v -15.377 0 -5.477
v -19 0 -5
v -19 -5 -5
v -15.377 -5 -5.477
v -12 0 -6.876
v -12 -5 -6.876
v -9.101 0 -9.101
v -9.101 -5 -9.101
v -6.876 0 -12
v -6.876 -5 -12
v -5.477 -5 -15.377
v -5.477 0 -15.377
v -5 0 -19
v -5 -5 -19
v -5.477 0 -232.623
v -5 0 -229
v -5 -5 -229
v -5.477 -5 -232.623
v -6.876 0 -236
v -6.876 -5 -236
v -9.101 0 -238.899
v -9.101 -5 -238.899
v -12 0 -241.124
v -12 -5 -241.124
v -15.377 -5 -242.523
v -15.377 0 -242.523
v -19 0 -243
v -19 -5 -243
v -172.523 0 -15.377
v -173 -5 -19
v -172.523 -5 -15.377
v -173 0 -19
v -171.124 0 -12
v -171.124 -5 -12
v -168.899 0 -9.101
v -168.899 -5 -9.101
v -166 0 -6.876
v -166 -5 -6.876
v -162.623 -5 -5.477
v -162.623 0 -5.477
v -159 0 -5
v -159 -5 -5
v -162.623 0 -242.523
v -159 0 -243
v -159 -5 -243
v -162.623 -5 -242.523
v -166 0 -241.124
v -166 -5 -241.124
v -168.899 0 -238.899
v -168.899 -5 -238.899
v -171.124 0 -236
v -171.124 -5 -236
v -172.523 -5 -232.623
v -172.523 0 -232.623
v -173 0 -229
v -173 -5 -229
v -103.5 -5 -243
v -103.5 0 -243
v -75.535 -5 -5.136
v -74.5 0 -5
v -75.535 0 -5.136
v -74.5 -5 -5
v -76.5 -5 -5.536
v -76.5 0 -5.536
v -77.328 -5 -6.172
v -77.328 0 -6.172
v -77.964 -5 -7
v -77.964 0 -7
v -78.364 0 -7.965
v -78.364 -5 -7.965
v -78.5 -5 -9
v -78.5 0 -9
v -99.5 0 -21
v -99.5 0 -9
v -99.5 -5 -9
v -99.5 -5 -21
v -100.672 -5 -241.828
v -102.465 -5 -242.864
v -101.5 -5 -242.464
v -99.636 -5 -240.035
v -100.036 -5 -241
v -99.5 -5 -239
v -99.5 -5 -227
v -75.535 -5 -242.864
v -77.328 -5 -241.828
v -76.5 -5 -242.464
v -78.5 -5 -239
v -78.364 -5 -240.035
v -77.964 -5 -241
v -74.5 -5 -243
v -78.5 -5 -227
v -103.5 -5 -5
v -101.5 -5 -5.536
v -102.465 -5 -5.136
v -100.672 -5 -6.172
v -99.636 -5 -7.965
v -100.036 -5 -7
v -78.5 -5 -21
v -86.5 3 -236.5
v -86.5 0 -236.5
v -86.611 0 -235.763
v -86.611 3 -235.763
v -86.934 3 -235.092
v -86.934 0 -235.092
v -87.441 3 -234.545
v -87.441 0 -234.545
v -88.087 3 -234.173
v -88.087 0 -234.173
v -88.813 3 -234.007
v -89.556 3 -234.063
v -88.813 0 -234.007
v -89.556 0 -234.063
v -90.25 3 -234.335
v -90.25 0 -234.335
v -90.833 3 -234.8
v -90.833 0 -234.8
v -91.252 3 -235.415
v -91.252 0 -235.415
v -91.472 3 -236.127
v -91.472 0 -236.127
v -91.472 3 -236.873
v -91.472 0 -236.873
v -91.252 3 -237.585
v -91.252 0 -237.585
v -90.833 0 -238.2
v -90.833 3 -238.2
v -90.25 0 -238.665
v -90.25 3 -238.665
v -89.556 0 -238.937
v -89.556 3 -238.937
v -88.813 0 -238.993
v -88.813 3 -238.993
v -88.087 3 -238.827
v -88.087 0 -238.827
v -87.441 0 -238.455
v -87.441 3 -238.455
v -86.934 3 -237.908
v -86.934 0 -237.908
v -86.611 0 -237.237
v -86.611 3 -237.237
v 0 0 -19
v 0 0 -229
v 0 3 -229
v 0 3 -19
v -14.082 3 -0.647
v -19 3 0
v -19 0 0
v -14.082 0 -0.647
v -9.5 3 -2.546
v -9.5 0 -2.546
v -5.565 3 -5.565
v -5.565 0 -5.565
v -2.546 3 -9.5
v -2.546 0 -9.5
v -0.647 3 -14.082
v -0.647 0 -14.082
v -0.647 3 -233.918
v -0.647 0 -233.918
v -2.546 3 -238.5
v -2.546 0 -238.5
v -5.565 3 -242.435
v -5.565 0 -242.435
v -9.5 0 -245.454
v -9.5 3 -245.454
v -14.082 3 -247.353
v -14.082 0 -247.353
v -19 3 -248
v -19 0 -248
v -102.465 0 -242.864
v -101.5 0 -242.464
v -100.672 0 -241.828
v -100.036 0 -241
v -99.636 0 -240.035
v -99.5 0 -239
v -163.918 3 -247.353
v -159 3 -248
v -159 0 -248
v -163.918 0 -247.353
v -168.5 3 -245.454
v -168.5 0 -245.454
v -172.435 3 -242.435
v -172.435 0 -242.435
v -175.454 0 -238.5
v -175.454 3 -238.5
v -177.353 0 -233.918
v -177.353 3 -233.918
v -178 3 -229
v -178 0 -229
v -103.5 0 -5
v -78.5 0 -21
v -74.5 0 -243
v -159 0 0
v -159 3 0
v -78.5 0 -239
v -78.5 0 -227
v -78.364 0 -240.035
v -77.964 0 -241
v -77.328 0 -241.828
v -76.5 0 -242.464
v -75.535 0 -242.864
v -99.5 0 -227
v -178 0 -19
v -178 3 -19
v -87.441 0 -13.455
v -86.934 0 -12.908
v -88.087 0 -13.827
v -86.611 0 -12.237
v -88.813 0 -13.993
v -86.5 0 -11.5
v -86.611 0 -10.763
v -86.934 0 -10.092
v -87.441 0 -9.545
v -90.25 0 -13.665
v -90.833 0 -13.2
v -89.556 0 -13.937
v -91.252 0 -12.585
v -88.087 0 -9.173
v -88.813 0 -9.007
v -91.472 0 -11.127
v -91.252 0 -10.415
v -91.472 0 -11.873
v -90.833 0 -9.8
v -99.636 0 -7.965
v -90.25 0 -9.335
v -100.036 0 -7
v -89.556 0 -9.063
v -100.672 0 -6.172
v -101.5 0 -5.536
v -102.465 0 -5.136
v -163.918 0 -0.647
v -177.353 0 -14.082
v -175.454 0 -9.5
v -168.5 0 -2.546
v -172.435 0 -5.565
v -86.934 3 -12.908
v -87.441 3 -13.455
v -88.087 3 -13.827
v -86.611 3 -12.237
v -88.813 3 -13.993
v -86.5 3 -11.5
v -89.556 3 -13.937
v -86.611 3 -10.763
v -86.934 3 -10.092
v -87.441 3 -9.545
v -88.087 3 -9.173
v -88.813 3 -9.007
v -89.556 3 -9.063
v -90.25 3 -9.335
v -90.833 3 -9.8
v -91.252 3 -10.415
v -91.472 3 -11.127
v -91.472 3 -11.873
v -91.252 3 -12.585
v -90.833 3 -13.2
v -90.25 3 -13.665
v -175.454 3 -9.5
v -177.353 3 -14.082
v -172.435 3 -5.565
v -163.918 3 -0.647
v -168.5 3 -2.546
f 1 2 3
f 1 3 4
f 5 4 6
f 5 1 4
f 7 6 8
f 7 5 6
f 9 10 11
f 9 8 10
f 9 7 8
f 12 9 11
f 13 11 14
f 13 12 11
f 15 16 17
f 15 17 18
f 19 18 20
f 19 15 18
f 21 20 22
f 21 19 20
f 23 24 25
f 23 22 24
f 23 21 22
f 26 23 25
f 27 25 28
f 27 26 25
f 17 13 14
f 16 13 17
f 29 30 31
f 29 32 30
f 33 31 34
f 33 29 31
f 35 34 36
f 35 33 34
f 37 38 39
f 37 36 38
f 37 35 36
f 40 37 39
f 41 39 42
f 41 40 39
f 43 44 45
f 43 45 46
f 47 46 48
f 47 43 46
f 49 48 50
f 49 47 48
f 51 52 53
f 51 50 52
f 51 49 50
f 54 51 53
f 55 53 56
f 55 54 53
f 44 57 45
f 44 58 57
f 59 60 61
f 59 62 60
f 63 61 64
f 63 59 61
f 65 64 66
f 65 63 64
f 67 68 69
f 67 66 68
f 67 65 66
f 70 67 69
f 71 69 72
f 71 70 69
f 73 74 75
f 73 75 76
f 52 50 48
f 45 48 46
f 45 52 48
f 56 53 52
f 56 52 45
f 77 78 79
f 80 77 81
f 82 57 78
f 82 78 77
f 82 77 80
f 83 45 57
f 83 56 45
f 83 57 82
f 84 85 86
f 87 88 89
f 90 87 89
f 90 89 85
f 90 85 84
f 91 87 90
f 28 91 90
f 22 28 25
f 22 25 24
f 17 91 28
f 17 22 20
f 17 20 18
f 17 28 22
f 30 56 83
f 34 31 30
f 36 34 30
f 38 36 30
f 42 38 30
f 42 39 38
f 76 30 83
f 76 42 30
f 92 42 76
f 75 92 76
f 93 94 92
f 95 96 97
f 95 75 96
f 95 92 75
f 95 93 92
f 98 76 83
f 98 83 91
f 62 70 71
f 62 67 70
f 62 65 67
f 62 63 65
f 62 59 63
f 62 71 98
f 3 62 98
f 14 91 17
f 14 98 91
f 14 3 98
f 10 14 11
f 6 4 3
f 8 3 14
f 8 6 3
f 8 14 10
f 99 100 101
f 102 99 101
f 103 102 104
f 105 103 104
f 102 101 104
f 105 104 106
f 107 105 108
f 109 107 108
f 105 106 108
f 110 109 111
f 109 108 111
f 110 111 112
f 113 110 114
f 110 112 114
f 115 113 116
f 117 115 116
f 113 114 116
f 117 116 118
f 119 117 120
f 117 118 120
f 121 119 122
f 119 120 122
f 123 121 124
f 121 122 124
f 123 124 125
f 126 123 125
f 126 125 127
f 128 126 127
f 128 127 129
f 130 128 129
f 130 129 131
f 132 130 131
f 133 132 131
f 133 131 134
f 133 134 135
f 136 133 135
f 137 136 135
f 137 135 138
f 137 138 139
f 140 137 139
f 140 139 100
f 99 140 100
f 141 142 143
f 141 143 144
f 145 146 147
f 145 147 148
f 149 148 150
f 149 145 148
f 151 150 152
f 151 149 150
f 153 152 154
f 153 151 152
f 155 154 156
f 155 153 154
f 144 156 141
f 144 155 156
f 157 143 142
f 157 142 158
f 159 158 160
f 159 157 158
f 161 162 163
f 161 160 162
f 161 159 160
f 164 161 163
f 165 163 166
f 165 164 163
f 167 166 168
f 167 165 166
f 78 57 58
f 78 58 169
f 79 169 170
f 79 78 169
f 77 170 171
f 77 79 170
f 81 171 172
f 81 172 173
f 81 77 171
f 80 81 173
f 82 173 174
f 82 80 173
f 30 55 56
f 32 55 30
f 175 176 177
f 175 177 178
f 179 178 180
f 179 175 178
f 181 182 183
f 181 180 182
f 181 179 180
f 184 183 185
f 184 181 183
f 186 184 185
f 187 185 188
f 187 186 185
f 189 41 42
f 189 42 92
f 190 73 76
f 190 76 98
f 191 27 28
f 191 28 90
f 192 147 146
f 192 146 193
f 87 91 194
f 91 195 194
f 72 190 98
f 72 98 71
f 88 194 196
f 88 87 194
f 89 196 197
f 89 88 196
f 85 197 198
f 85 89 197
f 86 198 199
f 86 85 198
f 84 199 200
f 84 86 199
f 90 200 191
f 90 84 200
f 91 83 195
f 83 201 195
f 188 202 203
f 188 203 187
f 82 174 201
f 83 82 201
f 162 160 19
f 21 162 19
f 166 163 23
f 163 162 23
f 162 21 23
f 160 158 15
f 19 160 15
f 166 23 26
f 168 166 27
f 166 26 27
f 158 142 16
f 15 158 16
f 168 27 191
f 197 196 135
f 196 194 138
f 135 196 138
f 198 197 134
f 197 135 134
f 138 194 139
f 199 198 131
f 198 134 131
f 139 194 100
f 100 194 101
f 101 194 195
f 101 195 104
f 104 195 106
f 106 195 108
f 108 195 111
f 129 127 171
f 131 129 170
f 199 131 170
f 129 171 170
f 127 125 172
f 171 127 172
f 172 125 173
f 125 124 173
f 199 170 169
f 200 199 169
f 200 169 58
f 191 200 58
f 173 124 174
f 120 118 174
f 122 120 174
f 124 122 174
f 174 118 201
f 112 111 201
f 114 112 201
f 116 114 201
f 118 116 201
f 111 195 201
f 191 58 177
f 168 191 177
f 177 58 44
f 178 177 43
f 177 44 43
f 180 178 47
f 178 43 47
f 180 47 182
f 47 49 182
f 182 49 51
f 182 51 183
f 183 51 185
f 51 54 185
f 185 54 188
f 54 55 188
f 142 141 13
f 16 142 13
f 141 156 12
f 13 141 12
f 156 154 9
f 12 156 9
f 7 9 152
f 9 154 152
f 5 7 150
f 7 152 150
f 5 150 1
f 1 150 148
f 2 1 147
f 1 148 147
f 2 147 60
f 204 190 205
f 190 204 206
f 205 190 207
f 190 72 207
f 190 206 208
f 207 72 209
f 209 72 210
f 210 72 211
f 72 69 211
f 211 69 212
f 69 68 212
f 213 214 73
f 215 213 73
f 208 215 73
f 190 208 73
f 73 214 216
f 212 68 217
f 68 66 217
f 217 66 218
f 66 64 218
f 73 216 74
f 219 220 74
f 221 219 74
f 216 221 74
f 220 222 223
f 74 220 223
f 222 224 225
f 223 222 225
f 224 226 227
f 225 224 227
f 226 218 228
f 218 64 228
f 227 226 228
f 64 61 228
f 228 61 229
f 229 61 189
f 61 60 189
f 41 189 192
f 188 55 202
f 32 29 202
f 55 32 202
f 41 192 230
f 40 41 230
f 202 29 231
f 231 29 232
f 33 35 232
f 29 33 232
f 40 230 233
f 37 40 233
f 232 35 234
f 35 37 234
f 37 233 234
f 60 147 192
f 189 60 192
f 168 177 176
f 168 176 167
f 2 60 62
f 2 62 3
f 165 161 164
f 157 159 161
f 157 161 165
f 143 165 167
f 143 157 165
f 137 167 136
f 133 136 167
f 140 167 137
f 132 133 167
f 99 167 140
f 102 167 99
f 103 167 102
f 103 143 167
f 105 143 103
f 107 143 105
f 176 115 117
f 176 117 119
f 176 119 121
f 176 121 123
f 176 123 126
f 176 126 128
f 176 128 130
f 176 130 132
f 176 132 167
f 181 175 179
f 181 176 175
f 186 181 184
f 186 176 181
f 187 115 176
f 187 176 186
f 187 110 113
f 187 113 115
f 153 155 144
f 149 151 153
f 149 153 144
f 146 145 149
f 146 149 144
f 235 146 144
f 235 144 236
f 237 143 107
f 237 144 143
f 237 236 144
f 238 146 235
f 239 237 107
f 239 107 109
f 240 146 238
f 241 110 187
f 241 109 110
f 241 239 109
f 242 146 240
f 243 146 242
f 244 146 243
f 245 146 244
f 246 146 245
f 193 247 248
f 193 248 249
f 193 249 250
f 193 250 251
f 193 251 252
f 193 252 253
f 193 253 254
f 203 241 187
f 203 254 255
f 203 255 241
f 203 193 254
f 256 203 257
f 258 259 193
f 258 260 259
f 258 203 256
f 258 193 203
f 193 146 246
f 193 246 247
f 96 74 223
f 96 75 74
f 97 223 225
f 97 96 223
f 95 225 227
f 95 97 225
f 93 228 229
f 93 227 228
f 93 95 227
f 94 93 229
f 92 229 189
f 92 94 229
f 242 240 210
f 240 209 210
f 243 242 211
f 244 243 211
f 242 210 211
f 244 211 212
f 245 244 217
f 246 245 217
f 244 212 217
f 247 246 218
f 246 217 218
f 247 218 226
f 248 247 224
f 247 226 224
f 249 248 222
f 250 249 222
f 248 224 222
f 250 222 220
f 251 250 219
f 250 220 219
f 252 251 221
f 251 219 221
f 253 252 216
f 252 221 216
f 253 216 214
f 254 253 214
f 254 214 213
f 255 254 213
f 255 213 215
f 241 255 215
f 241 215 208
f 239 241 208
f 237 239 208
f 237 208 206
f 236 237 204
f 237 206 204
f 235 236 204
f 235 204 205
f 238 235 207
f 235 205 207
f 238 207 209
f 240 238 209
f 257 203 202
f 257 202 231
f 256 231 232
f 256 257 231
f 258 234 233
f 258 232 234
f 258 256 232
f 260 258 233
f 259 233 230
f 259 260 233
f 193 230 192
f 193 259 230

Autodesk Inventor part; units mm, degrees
ref_plane "YZ Plane" through (0, 0, 0) normal (1, 0, 0) x (0, 1, 0)
ref_plane "XZ Plane" through (0, 0, 0) normal (0, 1, 0) x (-1, 0, 0)
ref_plane "XY Plane" through (0, 0, 0) normal (0, 0, 1) x (1, 0, 0)
sketch "Sketch1" plane through (0, 0, 0) normal (0, 1, 0) x (-1, 0, 0)
  line L0 (0, 0) -> (178, 0)
  line L1 (178, 0) -> (178, -248)
  line L2 (178, -248) -> (0, -248)
  line L3 (0, -248) -> (0, 0)
  dimension "d0" = 178
  dimension "d1" = 248
extrude "Extrusion1" add sketch "Sketch1" along normal blind 3
fillet "Fillet1" radius 19 4 edges at (0, 1.5, 0) (-178, 1.5, 0) (0, 1.5, -248) (-178, 1.5, -248)
sketch "Sketch2" plane through (0, 0, 0) normal (0, -1, 0) x (1, 0, 0)
  arc A0 (-178, -229) -> (-159, -248) centre (-159, -229) ccw projected
  line L0 (-19, -248) -> (-159, -248) projected
  arc A1 (-19, -248) -> (0, -229) centre (-19, -229) ccw projected
  line L1 (0, -19) -> (0, -229) projected
  arc A2 (0, -19) -> (-19, 0) centre (-19, -19) ccw projected
  line L2 (-159, 0) -> (-19, 0) projected
  arc A3 (-159, 0) -> (-178, -19) centre (-159, -19) ccw projected
  line L3 (-178, -229) -> (-178, -19) projected
  arc A4 (-159, -5) -> (-173, -19) centre (-159, -19) ccw
  line L4 (-159, -5) -> (-19, -5)
  arc A5 (-5, -19) -> (-19, -5) centre (-19, -19) ccw
  line L5 (-5, -19) -> (-5, -229)
  arc A6 (-19, -243) -> (-5, -229) centre (-19, -229) ccw
  line L6 (-19, -243) -> (-159, -243)
  arc A7 (-173, -229) -> (-159, -243) centre (-159, -229) ccw
  line L7 (-173, -229) -> (-173, -19)
  line L8 (-78.5, -243) -> (-99.5, -243)
  line L9 (-99.5, -243) -> (-99.5, -227)
  line L10 (-99.5, -227) -> (-78.5, -227)
  line L11 (-78.5, -227) -> (-78.5, -243)
  line L12 (-173, -124) -> (-5, -124) construction
  line L13 (-78.5, -5) -> (-99.5, -5)
  line L14 (-99.5, -5) -> (-99.5, -21)
  line L15 (-99.5, -21) -> (-78.5, -21)
  line L16 (-78.5, -21) -> (-78.5, -5)
  circle A8 centre (-89, -11.5) radius 2.5
  line L17 (-89, -227) -> (-89, -21) construction
  circle A9 centre (-89, -236.5) radius 2.5
  point P0 (0, 0)
  point P1 (-89, -243)
  point P2 (-89, -5)
  point P3 (-99.5, -243)
  point P4 (-78.5, -5)
  point P5 (-99.5, -5)
  dimension "d12" = 21
  dimension "d13" = 21
  dimension "d14" = 5
  dimension "d16" = 5
  dimension "d18" = 225
extrude "Extrusion2" add sketch "Sketch2" along normal blind 5 contours L4 L14 L15 L16 A5 L5 A6 L6 L11 L10 L9 A7 L7 A4
extrude "Extrusion4" cut sketch "Sketch2" against normal up to surface (3 mm away) contours A8 | A9
fillet "Fillet2" radius 4 4 edges at (-99.5, -2.5, -243) (-78.5, -2.5, -243) (-99.5, -2.5, -5) (-78.5, -2.5, -5)
equation "\"d5\" = d16"
equation "\"d19\" = d16"
properties part number "case5_3DPrint"
